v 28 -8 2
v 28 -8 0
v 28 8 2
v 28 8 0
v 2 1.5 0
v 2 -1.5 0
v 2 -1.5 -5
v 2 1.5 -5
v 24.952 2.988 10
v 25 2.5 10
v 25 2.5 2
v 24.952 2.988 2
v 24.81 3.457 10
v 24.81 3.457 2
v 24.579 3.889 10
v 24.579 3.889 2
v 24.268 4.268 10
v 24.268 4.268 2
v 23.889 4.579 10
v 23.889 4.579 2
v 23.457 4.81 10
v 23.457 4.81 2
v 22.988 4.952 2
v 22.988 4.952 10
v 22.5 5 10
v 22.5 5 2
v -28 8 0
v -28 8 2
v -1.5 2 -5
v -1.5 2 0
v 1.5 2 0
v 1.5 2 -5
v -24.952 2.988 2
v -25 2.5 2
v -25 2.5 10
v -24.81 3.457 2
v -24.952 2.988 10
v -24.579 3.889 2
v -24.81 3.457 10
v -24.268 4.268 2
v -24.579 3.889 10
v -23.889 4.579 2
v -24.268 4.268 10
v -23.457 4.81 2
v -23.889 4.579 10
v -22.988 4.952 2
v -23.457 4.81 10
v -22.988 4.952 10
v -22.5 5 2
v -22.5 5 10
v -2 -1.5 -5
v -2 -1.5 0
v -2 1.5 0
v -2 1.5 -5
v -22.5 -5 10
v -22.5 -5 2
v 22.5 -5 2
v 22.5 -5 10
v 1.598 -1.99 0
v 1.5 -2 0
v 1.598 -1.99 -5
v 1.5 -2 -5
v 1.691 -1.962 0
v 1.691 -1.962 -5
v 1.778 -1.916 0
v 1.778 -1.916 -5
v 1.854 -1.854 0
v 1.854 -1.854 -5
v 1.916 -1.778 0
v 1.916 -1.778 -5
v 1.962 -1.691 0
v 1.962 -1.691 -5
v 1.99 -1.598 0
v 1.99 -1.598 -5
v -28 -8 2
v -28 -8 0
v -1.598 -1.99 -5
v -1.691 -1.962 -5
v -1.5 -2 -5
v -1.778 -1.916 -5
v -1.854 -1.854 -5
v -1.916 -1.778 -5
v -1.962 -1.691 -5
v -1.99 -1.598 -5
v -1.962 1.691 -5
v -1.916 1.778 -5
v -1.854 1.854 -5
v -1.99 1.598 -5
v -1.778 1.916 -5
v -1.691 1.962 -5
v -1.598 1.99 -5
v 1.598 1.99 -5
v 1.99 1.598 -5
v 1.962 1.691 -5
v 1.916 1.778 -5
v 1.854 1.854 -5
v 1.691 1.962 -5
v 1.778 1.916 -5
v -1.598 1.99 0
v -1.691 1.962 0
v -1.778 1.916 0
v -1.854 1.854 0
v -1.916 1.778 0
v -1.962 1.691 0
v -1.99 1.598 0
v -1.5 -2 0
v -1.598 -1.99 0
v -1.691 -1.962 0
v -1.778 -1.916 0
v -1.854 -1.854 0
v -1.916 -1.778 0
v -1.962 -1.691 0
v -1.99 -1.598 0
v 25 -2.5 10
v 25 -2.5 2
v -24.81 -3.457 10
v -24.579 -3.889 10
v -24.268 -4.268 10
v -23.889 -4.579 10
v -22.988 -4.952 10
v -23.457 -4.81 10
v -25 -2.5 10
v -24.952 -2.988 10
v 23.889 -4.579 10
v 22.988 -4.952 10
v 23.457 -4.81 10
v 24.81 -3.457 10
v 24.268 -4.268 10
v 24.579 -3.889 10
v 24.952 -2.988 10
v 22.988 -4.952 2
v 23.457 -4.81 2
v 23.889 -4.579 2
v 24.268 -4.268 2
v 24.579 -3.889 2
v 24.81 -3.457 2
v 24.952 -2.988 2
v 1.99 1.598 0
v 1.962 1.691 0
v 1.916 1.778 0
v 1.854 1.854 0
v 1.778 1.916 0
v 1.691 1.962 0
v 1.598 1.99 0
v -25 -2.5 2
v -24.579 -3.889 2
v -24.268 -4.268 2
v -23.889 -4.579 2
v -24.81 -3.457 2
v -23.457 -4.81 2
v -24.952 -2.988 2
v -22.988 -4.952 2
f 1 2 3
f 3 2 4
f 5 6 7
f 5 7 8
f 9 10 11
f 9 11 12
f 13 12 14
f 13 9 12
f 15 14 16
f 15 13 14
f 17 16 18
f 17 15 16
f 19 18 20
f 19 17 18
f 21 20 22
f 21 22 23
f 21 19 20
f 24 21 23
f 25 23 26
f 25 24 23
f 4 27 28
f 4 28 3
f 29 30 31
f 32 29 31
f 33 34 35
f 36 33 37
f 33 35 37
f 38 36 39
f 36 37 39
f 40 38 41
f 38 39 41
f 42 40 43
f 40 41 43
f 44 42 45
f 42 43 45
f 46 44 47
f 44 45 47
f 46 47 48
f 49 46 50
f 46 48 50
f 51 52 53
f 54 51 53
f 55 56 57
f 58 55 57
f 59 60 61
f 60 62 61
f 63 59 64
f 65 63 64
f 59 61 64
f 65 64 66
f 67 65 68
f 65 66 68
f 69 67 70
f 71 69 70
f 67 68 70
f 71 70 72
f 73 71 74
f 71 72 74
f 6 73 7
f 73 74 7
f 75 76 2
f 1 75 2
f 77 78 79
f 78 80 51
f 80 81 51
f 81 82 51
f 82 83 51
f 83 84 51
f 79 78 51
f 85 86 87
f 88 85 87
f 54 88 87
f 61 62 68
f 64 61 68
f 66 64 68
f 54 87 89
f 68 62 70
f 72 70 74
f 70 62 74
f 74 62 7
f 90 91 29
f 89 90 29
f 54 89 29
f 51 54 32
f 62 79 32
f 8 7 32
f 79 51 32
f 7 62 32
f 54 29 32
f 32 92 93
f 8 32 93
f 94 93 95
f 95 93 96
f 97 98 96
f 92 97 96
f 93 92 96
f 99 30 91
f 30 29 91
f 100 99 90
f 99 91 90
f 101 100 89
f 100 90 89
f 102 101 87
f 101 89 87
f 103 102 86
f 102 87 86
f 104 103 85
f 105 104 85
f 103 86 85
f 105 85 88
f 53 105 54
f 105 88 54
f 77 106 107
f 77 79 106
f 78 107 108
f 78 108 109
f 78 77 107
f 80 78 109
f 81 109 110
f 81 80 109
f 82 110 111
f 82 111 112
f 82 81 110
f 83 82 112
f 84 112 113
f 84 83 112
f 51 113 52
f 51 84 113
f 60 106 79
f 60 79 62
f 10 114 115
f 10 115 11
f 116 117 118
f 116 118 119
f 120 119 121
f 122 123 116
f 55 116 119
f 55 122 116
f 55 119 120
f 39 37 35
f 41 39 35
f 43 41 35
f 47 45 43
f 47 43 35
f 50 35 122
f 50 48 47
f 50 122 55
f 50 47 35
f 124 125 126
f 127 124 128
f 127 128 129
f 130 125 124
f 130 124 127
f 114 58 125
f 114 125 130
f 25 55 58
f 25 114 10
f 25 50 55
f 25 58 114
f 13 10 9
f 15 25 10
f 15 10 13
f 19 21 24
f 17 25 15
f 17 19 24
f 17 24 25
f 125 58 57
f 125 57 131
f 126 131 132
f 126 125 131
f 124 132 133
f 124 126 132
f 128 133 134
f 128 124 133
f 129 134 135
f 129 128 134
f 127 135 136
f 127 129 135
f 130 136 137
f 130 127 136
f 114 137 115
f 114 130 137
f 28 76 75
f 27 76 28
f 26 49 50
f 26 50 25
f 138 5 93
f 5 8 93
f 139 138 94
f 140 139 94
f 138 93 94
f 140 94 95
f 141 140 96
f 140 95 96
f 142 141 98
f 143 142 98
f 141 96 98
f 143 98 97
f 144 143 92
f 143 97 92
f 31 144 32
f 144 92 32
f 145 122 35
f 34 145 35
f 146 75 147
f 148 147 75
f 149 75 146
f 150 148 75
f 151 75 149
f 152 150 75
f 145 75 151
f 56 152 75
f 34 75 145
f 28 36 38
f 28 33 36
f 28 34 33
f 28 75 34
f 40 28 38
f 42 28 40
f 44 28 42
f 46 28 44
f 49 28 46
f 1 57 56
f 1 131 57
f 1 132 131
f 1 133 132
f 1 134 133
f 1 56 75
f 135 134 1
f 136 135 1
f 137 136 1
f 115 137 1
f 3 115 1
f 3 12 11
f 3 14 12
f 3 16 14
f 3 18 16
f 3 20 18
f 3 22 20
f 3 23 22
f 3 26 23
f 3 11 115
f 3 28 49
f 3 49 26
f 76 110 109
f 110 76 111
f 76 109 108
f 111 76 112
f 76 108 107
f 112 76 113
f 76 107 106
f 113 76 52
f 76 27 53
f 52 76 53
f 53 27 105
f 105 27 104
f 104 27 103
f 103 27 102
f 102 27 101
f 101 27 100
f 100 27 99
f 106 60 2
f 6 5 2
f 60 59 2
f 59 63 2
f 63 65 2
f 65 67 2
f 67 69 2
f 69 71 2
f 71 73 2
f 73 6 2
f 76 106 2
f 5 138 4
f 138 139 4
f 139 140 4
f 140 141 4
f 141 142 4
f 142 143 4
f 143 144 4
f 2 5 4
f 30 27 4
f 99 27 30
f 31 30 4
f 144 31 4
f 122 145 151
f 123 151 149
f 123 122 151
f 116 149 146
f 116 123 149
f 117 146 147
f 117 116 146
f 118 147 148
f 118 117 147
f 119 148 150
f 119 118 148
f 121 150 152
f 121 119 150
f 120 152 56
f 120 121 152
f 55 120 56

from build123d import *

# Parameters (mm, degrees)
F0_W     = 50
F0_H     = 10
F0_W_2   = 4
F0_H_2   = 4
F0_R     = 1.6
F1_DEPTH = 10
F2_R     = 2.5
F0_W_3   = 56
F0_H_3   = 16
F3_DEPTH = 2
F4_DEPTH = 2
F5_DEPTH = 5
F7_R     = 0.5


# Not quite as in the source:
# - the program builds the solid bodies; features that only make, move or delete a surface that nothing else refers to are left out


with BuildPart() as f1:
    # F0 (on Top) → F1 (new body)
    with BuildSketch(Plane.XY):
        Rectangle(F0_W, F0_H)
        Rectangle(F0_W_2, F0_H_2, mode=Mode.SUBTRACT)
        Rectangle(F0_W_2, F0_H_2)
        Circle(F0_R, mode=Mode.SUBTRACT)
        Circle(F0_R)
    extrude(amount=F1_DEPTH)

    # F2
    f2_edges = [f1.edges().sort_by_distance(p)[0] for p in [
        (-25, -5, 5),
        (-25, 5, 5),
        (25, -5, 5),
        (25, 5, 5),
    ]]
    fillet(f2_edges, radius=F2_R)

    # F0 (on Top) → F3 (join)
    with BuildSketch(Plane.XY):
        Rectangle(F0_W_3, F0_H_3)
        Rectangle(F0_W, F0_H, mode=Mode.SUBTRACT)
    extrude(amount=F3_DEPTH)

    # F0 (on Top) → F4 (join)
    with BuildSketch(Plane.XY):
        Rectangle(F0_W, F0_H)
        Rectangle(F0_W_2, F0_H_2, mode=Mode.SUBTRACT)
    extrude(amount=F4_DEPTH)

    # F0 (on Top) → F5 (join)
    with BuildSketch(Plane.XY):
        Rectangle(F0_W_2, F0_H_2)
        Circle(F0_R, mode=Mode.SUBTRACT)
        Circle(F0_R)
    extrude(amount=-F5_DEPTH)

    # F7
    f7_edges = [f1.edges().sort_by_distance(p)[0] for p in [
        (-2, -2, -2.5),
        (2, -2, -2.5),
        (-2, 2, -2.5),
        (2, 2, -2.5),
    ]]
    fillet(f7_edges, radius=F7_R)


solid = f1.part
